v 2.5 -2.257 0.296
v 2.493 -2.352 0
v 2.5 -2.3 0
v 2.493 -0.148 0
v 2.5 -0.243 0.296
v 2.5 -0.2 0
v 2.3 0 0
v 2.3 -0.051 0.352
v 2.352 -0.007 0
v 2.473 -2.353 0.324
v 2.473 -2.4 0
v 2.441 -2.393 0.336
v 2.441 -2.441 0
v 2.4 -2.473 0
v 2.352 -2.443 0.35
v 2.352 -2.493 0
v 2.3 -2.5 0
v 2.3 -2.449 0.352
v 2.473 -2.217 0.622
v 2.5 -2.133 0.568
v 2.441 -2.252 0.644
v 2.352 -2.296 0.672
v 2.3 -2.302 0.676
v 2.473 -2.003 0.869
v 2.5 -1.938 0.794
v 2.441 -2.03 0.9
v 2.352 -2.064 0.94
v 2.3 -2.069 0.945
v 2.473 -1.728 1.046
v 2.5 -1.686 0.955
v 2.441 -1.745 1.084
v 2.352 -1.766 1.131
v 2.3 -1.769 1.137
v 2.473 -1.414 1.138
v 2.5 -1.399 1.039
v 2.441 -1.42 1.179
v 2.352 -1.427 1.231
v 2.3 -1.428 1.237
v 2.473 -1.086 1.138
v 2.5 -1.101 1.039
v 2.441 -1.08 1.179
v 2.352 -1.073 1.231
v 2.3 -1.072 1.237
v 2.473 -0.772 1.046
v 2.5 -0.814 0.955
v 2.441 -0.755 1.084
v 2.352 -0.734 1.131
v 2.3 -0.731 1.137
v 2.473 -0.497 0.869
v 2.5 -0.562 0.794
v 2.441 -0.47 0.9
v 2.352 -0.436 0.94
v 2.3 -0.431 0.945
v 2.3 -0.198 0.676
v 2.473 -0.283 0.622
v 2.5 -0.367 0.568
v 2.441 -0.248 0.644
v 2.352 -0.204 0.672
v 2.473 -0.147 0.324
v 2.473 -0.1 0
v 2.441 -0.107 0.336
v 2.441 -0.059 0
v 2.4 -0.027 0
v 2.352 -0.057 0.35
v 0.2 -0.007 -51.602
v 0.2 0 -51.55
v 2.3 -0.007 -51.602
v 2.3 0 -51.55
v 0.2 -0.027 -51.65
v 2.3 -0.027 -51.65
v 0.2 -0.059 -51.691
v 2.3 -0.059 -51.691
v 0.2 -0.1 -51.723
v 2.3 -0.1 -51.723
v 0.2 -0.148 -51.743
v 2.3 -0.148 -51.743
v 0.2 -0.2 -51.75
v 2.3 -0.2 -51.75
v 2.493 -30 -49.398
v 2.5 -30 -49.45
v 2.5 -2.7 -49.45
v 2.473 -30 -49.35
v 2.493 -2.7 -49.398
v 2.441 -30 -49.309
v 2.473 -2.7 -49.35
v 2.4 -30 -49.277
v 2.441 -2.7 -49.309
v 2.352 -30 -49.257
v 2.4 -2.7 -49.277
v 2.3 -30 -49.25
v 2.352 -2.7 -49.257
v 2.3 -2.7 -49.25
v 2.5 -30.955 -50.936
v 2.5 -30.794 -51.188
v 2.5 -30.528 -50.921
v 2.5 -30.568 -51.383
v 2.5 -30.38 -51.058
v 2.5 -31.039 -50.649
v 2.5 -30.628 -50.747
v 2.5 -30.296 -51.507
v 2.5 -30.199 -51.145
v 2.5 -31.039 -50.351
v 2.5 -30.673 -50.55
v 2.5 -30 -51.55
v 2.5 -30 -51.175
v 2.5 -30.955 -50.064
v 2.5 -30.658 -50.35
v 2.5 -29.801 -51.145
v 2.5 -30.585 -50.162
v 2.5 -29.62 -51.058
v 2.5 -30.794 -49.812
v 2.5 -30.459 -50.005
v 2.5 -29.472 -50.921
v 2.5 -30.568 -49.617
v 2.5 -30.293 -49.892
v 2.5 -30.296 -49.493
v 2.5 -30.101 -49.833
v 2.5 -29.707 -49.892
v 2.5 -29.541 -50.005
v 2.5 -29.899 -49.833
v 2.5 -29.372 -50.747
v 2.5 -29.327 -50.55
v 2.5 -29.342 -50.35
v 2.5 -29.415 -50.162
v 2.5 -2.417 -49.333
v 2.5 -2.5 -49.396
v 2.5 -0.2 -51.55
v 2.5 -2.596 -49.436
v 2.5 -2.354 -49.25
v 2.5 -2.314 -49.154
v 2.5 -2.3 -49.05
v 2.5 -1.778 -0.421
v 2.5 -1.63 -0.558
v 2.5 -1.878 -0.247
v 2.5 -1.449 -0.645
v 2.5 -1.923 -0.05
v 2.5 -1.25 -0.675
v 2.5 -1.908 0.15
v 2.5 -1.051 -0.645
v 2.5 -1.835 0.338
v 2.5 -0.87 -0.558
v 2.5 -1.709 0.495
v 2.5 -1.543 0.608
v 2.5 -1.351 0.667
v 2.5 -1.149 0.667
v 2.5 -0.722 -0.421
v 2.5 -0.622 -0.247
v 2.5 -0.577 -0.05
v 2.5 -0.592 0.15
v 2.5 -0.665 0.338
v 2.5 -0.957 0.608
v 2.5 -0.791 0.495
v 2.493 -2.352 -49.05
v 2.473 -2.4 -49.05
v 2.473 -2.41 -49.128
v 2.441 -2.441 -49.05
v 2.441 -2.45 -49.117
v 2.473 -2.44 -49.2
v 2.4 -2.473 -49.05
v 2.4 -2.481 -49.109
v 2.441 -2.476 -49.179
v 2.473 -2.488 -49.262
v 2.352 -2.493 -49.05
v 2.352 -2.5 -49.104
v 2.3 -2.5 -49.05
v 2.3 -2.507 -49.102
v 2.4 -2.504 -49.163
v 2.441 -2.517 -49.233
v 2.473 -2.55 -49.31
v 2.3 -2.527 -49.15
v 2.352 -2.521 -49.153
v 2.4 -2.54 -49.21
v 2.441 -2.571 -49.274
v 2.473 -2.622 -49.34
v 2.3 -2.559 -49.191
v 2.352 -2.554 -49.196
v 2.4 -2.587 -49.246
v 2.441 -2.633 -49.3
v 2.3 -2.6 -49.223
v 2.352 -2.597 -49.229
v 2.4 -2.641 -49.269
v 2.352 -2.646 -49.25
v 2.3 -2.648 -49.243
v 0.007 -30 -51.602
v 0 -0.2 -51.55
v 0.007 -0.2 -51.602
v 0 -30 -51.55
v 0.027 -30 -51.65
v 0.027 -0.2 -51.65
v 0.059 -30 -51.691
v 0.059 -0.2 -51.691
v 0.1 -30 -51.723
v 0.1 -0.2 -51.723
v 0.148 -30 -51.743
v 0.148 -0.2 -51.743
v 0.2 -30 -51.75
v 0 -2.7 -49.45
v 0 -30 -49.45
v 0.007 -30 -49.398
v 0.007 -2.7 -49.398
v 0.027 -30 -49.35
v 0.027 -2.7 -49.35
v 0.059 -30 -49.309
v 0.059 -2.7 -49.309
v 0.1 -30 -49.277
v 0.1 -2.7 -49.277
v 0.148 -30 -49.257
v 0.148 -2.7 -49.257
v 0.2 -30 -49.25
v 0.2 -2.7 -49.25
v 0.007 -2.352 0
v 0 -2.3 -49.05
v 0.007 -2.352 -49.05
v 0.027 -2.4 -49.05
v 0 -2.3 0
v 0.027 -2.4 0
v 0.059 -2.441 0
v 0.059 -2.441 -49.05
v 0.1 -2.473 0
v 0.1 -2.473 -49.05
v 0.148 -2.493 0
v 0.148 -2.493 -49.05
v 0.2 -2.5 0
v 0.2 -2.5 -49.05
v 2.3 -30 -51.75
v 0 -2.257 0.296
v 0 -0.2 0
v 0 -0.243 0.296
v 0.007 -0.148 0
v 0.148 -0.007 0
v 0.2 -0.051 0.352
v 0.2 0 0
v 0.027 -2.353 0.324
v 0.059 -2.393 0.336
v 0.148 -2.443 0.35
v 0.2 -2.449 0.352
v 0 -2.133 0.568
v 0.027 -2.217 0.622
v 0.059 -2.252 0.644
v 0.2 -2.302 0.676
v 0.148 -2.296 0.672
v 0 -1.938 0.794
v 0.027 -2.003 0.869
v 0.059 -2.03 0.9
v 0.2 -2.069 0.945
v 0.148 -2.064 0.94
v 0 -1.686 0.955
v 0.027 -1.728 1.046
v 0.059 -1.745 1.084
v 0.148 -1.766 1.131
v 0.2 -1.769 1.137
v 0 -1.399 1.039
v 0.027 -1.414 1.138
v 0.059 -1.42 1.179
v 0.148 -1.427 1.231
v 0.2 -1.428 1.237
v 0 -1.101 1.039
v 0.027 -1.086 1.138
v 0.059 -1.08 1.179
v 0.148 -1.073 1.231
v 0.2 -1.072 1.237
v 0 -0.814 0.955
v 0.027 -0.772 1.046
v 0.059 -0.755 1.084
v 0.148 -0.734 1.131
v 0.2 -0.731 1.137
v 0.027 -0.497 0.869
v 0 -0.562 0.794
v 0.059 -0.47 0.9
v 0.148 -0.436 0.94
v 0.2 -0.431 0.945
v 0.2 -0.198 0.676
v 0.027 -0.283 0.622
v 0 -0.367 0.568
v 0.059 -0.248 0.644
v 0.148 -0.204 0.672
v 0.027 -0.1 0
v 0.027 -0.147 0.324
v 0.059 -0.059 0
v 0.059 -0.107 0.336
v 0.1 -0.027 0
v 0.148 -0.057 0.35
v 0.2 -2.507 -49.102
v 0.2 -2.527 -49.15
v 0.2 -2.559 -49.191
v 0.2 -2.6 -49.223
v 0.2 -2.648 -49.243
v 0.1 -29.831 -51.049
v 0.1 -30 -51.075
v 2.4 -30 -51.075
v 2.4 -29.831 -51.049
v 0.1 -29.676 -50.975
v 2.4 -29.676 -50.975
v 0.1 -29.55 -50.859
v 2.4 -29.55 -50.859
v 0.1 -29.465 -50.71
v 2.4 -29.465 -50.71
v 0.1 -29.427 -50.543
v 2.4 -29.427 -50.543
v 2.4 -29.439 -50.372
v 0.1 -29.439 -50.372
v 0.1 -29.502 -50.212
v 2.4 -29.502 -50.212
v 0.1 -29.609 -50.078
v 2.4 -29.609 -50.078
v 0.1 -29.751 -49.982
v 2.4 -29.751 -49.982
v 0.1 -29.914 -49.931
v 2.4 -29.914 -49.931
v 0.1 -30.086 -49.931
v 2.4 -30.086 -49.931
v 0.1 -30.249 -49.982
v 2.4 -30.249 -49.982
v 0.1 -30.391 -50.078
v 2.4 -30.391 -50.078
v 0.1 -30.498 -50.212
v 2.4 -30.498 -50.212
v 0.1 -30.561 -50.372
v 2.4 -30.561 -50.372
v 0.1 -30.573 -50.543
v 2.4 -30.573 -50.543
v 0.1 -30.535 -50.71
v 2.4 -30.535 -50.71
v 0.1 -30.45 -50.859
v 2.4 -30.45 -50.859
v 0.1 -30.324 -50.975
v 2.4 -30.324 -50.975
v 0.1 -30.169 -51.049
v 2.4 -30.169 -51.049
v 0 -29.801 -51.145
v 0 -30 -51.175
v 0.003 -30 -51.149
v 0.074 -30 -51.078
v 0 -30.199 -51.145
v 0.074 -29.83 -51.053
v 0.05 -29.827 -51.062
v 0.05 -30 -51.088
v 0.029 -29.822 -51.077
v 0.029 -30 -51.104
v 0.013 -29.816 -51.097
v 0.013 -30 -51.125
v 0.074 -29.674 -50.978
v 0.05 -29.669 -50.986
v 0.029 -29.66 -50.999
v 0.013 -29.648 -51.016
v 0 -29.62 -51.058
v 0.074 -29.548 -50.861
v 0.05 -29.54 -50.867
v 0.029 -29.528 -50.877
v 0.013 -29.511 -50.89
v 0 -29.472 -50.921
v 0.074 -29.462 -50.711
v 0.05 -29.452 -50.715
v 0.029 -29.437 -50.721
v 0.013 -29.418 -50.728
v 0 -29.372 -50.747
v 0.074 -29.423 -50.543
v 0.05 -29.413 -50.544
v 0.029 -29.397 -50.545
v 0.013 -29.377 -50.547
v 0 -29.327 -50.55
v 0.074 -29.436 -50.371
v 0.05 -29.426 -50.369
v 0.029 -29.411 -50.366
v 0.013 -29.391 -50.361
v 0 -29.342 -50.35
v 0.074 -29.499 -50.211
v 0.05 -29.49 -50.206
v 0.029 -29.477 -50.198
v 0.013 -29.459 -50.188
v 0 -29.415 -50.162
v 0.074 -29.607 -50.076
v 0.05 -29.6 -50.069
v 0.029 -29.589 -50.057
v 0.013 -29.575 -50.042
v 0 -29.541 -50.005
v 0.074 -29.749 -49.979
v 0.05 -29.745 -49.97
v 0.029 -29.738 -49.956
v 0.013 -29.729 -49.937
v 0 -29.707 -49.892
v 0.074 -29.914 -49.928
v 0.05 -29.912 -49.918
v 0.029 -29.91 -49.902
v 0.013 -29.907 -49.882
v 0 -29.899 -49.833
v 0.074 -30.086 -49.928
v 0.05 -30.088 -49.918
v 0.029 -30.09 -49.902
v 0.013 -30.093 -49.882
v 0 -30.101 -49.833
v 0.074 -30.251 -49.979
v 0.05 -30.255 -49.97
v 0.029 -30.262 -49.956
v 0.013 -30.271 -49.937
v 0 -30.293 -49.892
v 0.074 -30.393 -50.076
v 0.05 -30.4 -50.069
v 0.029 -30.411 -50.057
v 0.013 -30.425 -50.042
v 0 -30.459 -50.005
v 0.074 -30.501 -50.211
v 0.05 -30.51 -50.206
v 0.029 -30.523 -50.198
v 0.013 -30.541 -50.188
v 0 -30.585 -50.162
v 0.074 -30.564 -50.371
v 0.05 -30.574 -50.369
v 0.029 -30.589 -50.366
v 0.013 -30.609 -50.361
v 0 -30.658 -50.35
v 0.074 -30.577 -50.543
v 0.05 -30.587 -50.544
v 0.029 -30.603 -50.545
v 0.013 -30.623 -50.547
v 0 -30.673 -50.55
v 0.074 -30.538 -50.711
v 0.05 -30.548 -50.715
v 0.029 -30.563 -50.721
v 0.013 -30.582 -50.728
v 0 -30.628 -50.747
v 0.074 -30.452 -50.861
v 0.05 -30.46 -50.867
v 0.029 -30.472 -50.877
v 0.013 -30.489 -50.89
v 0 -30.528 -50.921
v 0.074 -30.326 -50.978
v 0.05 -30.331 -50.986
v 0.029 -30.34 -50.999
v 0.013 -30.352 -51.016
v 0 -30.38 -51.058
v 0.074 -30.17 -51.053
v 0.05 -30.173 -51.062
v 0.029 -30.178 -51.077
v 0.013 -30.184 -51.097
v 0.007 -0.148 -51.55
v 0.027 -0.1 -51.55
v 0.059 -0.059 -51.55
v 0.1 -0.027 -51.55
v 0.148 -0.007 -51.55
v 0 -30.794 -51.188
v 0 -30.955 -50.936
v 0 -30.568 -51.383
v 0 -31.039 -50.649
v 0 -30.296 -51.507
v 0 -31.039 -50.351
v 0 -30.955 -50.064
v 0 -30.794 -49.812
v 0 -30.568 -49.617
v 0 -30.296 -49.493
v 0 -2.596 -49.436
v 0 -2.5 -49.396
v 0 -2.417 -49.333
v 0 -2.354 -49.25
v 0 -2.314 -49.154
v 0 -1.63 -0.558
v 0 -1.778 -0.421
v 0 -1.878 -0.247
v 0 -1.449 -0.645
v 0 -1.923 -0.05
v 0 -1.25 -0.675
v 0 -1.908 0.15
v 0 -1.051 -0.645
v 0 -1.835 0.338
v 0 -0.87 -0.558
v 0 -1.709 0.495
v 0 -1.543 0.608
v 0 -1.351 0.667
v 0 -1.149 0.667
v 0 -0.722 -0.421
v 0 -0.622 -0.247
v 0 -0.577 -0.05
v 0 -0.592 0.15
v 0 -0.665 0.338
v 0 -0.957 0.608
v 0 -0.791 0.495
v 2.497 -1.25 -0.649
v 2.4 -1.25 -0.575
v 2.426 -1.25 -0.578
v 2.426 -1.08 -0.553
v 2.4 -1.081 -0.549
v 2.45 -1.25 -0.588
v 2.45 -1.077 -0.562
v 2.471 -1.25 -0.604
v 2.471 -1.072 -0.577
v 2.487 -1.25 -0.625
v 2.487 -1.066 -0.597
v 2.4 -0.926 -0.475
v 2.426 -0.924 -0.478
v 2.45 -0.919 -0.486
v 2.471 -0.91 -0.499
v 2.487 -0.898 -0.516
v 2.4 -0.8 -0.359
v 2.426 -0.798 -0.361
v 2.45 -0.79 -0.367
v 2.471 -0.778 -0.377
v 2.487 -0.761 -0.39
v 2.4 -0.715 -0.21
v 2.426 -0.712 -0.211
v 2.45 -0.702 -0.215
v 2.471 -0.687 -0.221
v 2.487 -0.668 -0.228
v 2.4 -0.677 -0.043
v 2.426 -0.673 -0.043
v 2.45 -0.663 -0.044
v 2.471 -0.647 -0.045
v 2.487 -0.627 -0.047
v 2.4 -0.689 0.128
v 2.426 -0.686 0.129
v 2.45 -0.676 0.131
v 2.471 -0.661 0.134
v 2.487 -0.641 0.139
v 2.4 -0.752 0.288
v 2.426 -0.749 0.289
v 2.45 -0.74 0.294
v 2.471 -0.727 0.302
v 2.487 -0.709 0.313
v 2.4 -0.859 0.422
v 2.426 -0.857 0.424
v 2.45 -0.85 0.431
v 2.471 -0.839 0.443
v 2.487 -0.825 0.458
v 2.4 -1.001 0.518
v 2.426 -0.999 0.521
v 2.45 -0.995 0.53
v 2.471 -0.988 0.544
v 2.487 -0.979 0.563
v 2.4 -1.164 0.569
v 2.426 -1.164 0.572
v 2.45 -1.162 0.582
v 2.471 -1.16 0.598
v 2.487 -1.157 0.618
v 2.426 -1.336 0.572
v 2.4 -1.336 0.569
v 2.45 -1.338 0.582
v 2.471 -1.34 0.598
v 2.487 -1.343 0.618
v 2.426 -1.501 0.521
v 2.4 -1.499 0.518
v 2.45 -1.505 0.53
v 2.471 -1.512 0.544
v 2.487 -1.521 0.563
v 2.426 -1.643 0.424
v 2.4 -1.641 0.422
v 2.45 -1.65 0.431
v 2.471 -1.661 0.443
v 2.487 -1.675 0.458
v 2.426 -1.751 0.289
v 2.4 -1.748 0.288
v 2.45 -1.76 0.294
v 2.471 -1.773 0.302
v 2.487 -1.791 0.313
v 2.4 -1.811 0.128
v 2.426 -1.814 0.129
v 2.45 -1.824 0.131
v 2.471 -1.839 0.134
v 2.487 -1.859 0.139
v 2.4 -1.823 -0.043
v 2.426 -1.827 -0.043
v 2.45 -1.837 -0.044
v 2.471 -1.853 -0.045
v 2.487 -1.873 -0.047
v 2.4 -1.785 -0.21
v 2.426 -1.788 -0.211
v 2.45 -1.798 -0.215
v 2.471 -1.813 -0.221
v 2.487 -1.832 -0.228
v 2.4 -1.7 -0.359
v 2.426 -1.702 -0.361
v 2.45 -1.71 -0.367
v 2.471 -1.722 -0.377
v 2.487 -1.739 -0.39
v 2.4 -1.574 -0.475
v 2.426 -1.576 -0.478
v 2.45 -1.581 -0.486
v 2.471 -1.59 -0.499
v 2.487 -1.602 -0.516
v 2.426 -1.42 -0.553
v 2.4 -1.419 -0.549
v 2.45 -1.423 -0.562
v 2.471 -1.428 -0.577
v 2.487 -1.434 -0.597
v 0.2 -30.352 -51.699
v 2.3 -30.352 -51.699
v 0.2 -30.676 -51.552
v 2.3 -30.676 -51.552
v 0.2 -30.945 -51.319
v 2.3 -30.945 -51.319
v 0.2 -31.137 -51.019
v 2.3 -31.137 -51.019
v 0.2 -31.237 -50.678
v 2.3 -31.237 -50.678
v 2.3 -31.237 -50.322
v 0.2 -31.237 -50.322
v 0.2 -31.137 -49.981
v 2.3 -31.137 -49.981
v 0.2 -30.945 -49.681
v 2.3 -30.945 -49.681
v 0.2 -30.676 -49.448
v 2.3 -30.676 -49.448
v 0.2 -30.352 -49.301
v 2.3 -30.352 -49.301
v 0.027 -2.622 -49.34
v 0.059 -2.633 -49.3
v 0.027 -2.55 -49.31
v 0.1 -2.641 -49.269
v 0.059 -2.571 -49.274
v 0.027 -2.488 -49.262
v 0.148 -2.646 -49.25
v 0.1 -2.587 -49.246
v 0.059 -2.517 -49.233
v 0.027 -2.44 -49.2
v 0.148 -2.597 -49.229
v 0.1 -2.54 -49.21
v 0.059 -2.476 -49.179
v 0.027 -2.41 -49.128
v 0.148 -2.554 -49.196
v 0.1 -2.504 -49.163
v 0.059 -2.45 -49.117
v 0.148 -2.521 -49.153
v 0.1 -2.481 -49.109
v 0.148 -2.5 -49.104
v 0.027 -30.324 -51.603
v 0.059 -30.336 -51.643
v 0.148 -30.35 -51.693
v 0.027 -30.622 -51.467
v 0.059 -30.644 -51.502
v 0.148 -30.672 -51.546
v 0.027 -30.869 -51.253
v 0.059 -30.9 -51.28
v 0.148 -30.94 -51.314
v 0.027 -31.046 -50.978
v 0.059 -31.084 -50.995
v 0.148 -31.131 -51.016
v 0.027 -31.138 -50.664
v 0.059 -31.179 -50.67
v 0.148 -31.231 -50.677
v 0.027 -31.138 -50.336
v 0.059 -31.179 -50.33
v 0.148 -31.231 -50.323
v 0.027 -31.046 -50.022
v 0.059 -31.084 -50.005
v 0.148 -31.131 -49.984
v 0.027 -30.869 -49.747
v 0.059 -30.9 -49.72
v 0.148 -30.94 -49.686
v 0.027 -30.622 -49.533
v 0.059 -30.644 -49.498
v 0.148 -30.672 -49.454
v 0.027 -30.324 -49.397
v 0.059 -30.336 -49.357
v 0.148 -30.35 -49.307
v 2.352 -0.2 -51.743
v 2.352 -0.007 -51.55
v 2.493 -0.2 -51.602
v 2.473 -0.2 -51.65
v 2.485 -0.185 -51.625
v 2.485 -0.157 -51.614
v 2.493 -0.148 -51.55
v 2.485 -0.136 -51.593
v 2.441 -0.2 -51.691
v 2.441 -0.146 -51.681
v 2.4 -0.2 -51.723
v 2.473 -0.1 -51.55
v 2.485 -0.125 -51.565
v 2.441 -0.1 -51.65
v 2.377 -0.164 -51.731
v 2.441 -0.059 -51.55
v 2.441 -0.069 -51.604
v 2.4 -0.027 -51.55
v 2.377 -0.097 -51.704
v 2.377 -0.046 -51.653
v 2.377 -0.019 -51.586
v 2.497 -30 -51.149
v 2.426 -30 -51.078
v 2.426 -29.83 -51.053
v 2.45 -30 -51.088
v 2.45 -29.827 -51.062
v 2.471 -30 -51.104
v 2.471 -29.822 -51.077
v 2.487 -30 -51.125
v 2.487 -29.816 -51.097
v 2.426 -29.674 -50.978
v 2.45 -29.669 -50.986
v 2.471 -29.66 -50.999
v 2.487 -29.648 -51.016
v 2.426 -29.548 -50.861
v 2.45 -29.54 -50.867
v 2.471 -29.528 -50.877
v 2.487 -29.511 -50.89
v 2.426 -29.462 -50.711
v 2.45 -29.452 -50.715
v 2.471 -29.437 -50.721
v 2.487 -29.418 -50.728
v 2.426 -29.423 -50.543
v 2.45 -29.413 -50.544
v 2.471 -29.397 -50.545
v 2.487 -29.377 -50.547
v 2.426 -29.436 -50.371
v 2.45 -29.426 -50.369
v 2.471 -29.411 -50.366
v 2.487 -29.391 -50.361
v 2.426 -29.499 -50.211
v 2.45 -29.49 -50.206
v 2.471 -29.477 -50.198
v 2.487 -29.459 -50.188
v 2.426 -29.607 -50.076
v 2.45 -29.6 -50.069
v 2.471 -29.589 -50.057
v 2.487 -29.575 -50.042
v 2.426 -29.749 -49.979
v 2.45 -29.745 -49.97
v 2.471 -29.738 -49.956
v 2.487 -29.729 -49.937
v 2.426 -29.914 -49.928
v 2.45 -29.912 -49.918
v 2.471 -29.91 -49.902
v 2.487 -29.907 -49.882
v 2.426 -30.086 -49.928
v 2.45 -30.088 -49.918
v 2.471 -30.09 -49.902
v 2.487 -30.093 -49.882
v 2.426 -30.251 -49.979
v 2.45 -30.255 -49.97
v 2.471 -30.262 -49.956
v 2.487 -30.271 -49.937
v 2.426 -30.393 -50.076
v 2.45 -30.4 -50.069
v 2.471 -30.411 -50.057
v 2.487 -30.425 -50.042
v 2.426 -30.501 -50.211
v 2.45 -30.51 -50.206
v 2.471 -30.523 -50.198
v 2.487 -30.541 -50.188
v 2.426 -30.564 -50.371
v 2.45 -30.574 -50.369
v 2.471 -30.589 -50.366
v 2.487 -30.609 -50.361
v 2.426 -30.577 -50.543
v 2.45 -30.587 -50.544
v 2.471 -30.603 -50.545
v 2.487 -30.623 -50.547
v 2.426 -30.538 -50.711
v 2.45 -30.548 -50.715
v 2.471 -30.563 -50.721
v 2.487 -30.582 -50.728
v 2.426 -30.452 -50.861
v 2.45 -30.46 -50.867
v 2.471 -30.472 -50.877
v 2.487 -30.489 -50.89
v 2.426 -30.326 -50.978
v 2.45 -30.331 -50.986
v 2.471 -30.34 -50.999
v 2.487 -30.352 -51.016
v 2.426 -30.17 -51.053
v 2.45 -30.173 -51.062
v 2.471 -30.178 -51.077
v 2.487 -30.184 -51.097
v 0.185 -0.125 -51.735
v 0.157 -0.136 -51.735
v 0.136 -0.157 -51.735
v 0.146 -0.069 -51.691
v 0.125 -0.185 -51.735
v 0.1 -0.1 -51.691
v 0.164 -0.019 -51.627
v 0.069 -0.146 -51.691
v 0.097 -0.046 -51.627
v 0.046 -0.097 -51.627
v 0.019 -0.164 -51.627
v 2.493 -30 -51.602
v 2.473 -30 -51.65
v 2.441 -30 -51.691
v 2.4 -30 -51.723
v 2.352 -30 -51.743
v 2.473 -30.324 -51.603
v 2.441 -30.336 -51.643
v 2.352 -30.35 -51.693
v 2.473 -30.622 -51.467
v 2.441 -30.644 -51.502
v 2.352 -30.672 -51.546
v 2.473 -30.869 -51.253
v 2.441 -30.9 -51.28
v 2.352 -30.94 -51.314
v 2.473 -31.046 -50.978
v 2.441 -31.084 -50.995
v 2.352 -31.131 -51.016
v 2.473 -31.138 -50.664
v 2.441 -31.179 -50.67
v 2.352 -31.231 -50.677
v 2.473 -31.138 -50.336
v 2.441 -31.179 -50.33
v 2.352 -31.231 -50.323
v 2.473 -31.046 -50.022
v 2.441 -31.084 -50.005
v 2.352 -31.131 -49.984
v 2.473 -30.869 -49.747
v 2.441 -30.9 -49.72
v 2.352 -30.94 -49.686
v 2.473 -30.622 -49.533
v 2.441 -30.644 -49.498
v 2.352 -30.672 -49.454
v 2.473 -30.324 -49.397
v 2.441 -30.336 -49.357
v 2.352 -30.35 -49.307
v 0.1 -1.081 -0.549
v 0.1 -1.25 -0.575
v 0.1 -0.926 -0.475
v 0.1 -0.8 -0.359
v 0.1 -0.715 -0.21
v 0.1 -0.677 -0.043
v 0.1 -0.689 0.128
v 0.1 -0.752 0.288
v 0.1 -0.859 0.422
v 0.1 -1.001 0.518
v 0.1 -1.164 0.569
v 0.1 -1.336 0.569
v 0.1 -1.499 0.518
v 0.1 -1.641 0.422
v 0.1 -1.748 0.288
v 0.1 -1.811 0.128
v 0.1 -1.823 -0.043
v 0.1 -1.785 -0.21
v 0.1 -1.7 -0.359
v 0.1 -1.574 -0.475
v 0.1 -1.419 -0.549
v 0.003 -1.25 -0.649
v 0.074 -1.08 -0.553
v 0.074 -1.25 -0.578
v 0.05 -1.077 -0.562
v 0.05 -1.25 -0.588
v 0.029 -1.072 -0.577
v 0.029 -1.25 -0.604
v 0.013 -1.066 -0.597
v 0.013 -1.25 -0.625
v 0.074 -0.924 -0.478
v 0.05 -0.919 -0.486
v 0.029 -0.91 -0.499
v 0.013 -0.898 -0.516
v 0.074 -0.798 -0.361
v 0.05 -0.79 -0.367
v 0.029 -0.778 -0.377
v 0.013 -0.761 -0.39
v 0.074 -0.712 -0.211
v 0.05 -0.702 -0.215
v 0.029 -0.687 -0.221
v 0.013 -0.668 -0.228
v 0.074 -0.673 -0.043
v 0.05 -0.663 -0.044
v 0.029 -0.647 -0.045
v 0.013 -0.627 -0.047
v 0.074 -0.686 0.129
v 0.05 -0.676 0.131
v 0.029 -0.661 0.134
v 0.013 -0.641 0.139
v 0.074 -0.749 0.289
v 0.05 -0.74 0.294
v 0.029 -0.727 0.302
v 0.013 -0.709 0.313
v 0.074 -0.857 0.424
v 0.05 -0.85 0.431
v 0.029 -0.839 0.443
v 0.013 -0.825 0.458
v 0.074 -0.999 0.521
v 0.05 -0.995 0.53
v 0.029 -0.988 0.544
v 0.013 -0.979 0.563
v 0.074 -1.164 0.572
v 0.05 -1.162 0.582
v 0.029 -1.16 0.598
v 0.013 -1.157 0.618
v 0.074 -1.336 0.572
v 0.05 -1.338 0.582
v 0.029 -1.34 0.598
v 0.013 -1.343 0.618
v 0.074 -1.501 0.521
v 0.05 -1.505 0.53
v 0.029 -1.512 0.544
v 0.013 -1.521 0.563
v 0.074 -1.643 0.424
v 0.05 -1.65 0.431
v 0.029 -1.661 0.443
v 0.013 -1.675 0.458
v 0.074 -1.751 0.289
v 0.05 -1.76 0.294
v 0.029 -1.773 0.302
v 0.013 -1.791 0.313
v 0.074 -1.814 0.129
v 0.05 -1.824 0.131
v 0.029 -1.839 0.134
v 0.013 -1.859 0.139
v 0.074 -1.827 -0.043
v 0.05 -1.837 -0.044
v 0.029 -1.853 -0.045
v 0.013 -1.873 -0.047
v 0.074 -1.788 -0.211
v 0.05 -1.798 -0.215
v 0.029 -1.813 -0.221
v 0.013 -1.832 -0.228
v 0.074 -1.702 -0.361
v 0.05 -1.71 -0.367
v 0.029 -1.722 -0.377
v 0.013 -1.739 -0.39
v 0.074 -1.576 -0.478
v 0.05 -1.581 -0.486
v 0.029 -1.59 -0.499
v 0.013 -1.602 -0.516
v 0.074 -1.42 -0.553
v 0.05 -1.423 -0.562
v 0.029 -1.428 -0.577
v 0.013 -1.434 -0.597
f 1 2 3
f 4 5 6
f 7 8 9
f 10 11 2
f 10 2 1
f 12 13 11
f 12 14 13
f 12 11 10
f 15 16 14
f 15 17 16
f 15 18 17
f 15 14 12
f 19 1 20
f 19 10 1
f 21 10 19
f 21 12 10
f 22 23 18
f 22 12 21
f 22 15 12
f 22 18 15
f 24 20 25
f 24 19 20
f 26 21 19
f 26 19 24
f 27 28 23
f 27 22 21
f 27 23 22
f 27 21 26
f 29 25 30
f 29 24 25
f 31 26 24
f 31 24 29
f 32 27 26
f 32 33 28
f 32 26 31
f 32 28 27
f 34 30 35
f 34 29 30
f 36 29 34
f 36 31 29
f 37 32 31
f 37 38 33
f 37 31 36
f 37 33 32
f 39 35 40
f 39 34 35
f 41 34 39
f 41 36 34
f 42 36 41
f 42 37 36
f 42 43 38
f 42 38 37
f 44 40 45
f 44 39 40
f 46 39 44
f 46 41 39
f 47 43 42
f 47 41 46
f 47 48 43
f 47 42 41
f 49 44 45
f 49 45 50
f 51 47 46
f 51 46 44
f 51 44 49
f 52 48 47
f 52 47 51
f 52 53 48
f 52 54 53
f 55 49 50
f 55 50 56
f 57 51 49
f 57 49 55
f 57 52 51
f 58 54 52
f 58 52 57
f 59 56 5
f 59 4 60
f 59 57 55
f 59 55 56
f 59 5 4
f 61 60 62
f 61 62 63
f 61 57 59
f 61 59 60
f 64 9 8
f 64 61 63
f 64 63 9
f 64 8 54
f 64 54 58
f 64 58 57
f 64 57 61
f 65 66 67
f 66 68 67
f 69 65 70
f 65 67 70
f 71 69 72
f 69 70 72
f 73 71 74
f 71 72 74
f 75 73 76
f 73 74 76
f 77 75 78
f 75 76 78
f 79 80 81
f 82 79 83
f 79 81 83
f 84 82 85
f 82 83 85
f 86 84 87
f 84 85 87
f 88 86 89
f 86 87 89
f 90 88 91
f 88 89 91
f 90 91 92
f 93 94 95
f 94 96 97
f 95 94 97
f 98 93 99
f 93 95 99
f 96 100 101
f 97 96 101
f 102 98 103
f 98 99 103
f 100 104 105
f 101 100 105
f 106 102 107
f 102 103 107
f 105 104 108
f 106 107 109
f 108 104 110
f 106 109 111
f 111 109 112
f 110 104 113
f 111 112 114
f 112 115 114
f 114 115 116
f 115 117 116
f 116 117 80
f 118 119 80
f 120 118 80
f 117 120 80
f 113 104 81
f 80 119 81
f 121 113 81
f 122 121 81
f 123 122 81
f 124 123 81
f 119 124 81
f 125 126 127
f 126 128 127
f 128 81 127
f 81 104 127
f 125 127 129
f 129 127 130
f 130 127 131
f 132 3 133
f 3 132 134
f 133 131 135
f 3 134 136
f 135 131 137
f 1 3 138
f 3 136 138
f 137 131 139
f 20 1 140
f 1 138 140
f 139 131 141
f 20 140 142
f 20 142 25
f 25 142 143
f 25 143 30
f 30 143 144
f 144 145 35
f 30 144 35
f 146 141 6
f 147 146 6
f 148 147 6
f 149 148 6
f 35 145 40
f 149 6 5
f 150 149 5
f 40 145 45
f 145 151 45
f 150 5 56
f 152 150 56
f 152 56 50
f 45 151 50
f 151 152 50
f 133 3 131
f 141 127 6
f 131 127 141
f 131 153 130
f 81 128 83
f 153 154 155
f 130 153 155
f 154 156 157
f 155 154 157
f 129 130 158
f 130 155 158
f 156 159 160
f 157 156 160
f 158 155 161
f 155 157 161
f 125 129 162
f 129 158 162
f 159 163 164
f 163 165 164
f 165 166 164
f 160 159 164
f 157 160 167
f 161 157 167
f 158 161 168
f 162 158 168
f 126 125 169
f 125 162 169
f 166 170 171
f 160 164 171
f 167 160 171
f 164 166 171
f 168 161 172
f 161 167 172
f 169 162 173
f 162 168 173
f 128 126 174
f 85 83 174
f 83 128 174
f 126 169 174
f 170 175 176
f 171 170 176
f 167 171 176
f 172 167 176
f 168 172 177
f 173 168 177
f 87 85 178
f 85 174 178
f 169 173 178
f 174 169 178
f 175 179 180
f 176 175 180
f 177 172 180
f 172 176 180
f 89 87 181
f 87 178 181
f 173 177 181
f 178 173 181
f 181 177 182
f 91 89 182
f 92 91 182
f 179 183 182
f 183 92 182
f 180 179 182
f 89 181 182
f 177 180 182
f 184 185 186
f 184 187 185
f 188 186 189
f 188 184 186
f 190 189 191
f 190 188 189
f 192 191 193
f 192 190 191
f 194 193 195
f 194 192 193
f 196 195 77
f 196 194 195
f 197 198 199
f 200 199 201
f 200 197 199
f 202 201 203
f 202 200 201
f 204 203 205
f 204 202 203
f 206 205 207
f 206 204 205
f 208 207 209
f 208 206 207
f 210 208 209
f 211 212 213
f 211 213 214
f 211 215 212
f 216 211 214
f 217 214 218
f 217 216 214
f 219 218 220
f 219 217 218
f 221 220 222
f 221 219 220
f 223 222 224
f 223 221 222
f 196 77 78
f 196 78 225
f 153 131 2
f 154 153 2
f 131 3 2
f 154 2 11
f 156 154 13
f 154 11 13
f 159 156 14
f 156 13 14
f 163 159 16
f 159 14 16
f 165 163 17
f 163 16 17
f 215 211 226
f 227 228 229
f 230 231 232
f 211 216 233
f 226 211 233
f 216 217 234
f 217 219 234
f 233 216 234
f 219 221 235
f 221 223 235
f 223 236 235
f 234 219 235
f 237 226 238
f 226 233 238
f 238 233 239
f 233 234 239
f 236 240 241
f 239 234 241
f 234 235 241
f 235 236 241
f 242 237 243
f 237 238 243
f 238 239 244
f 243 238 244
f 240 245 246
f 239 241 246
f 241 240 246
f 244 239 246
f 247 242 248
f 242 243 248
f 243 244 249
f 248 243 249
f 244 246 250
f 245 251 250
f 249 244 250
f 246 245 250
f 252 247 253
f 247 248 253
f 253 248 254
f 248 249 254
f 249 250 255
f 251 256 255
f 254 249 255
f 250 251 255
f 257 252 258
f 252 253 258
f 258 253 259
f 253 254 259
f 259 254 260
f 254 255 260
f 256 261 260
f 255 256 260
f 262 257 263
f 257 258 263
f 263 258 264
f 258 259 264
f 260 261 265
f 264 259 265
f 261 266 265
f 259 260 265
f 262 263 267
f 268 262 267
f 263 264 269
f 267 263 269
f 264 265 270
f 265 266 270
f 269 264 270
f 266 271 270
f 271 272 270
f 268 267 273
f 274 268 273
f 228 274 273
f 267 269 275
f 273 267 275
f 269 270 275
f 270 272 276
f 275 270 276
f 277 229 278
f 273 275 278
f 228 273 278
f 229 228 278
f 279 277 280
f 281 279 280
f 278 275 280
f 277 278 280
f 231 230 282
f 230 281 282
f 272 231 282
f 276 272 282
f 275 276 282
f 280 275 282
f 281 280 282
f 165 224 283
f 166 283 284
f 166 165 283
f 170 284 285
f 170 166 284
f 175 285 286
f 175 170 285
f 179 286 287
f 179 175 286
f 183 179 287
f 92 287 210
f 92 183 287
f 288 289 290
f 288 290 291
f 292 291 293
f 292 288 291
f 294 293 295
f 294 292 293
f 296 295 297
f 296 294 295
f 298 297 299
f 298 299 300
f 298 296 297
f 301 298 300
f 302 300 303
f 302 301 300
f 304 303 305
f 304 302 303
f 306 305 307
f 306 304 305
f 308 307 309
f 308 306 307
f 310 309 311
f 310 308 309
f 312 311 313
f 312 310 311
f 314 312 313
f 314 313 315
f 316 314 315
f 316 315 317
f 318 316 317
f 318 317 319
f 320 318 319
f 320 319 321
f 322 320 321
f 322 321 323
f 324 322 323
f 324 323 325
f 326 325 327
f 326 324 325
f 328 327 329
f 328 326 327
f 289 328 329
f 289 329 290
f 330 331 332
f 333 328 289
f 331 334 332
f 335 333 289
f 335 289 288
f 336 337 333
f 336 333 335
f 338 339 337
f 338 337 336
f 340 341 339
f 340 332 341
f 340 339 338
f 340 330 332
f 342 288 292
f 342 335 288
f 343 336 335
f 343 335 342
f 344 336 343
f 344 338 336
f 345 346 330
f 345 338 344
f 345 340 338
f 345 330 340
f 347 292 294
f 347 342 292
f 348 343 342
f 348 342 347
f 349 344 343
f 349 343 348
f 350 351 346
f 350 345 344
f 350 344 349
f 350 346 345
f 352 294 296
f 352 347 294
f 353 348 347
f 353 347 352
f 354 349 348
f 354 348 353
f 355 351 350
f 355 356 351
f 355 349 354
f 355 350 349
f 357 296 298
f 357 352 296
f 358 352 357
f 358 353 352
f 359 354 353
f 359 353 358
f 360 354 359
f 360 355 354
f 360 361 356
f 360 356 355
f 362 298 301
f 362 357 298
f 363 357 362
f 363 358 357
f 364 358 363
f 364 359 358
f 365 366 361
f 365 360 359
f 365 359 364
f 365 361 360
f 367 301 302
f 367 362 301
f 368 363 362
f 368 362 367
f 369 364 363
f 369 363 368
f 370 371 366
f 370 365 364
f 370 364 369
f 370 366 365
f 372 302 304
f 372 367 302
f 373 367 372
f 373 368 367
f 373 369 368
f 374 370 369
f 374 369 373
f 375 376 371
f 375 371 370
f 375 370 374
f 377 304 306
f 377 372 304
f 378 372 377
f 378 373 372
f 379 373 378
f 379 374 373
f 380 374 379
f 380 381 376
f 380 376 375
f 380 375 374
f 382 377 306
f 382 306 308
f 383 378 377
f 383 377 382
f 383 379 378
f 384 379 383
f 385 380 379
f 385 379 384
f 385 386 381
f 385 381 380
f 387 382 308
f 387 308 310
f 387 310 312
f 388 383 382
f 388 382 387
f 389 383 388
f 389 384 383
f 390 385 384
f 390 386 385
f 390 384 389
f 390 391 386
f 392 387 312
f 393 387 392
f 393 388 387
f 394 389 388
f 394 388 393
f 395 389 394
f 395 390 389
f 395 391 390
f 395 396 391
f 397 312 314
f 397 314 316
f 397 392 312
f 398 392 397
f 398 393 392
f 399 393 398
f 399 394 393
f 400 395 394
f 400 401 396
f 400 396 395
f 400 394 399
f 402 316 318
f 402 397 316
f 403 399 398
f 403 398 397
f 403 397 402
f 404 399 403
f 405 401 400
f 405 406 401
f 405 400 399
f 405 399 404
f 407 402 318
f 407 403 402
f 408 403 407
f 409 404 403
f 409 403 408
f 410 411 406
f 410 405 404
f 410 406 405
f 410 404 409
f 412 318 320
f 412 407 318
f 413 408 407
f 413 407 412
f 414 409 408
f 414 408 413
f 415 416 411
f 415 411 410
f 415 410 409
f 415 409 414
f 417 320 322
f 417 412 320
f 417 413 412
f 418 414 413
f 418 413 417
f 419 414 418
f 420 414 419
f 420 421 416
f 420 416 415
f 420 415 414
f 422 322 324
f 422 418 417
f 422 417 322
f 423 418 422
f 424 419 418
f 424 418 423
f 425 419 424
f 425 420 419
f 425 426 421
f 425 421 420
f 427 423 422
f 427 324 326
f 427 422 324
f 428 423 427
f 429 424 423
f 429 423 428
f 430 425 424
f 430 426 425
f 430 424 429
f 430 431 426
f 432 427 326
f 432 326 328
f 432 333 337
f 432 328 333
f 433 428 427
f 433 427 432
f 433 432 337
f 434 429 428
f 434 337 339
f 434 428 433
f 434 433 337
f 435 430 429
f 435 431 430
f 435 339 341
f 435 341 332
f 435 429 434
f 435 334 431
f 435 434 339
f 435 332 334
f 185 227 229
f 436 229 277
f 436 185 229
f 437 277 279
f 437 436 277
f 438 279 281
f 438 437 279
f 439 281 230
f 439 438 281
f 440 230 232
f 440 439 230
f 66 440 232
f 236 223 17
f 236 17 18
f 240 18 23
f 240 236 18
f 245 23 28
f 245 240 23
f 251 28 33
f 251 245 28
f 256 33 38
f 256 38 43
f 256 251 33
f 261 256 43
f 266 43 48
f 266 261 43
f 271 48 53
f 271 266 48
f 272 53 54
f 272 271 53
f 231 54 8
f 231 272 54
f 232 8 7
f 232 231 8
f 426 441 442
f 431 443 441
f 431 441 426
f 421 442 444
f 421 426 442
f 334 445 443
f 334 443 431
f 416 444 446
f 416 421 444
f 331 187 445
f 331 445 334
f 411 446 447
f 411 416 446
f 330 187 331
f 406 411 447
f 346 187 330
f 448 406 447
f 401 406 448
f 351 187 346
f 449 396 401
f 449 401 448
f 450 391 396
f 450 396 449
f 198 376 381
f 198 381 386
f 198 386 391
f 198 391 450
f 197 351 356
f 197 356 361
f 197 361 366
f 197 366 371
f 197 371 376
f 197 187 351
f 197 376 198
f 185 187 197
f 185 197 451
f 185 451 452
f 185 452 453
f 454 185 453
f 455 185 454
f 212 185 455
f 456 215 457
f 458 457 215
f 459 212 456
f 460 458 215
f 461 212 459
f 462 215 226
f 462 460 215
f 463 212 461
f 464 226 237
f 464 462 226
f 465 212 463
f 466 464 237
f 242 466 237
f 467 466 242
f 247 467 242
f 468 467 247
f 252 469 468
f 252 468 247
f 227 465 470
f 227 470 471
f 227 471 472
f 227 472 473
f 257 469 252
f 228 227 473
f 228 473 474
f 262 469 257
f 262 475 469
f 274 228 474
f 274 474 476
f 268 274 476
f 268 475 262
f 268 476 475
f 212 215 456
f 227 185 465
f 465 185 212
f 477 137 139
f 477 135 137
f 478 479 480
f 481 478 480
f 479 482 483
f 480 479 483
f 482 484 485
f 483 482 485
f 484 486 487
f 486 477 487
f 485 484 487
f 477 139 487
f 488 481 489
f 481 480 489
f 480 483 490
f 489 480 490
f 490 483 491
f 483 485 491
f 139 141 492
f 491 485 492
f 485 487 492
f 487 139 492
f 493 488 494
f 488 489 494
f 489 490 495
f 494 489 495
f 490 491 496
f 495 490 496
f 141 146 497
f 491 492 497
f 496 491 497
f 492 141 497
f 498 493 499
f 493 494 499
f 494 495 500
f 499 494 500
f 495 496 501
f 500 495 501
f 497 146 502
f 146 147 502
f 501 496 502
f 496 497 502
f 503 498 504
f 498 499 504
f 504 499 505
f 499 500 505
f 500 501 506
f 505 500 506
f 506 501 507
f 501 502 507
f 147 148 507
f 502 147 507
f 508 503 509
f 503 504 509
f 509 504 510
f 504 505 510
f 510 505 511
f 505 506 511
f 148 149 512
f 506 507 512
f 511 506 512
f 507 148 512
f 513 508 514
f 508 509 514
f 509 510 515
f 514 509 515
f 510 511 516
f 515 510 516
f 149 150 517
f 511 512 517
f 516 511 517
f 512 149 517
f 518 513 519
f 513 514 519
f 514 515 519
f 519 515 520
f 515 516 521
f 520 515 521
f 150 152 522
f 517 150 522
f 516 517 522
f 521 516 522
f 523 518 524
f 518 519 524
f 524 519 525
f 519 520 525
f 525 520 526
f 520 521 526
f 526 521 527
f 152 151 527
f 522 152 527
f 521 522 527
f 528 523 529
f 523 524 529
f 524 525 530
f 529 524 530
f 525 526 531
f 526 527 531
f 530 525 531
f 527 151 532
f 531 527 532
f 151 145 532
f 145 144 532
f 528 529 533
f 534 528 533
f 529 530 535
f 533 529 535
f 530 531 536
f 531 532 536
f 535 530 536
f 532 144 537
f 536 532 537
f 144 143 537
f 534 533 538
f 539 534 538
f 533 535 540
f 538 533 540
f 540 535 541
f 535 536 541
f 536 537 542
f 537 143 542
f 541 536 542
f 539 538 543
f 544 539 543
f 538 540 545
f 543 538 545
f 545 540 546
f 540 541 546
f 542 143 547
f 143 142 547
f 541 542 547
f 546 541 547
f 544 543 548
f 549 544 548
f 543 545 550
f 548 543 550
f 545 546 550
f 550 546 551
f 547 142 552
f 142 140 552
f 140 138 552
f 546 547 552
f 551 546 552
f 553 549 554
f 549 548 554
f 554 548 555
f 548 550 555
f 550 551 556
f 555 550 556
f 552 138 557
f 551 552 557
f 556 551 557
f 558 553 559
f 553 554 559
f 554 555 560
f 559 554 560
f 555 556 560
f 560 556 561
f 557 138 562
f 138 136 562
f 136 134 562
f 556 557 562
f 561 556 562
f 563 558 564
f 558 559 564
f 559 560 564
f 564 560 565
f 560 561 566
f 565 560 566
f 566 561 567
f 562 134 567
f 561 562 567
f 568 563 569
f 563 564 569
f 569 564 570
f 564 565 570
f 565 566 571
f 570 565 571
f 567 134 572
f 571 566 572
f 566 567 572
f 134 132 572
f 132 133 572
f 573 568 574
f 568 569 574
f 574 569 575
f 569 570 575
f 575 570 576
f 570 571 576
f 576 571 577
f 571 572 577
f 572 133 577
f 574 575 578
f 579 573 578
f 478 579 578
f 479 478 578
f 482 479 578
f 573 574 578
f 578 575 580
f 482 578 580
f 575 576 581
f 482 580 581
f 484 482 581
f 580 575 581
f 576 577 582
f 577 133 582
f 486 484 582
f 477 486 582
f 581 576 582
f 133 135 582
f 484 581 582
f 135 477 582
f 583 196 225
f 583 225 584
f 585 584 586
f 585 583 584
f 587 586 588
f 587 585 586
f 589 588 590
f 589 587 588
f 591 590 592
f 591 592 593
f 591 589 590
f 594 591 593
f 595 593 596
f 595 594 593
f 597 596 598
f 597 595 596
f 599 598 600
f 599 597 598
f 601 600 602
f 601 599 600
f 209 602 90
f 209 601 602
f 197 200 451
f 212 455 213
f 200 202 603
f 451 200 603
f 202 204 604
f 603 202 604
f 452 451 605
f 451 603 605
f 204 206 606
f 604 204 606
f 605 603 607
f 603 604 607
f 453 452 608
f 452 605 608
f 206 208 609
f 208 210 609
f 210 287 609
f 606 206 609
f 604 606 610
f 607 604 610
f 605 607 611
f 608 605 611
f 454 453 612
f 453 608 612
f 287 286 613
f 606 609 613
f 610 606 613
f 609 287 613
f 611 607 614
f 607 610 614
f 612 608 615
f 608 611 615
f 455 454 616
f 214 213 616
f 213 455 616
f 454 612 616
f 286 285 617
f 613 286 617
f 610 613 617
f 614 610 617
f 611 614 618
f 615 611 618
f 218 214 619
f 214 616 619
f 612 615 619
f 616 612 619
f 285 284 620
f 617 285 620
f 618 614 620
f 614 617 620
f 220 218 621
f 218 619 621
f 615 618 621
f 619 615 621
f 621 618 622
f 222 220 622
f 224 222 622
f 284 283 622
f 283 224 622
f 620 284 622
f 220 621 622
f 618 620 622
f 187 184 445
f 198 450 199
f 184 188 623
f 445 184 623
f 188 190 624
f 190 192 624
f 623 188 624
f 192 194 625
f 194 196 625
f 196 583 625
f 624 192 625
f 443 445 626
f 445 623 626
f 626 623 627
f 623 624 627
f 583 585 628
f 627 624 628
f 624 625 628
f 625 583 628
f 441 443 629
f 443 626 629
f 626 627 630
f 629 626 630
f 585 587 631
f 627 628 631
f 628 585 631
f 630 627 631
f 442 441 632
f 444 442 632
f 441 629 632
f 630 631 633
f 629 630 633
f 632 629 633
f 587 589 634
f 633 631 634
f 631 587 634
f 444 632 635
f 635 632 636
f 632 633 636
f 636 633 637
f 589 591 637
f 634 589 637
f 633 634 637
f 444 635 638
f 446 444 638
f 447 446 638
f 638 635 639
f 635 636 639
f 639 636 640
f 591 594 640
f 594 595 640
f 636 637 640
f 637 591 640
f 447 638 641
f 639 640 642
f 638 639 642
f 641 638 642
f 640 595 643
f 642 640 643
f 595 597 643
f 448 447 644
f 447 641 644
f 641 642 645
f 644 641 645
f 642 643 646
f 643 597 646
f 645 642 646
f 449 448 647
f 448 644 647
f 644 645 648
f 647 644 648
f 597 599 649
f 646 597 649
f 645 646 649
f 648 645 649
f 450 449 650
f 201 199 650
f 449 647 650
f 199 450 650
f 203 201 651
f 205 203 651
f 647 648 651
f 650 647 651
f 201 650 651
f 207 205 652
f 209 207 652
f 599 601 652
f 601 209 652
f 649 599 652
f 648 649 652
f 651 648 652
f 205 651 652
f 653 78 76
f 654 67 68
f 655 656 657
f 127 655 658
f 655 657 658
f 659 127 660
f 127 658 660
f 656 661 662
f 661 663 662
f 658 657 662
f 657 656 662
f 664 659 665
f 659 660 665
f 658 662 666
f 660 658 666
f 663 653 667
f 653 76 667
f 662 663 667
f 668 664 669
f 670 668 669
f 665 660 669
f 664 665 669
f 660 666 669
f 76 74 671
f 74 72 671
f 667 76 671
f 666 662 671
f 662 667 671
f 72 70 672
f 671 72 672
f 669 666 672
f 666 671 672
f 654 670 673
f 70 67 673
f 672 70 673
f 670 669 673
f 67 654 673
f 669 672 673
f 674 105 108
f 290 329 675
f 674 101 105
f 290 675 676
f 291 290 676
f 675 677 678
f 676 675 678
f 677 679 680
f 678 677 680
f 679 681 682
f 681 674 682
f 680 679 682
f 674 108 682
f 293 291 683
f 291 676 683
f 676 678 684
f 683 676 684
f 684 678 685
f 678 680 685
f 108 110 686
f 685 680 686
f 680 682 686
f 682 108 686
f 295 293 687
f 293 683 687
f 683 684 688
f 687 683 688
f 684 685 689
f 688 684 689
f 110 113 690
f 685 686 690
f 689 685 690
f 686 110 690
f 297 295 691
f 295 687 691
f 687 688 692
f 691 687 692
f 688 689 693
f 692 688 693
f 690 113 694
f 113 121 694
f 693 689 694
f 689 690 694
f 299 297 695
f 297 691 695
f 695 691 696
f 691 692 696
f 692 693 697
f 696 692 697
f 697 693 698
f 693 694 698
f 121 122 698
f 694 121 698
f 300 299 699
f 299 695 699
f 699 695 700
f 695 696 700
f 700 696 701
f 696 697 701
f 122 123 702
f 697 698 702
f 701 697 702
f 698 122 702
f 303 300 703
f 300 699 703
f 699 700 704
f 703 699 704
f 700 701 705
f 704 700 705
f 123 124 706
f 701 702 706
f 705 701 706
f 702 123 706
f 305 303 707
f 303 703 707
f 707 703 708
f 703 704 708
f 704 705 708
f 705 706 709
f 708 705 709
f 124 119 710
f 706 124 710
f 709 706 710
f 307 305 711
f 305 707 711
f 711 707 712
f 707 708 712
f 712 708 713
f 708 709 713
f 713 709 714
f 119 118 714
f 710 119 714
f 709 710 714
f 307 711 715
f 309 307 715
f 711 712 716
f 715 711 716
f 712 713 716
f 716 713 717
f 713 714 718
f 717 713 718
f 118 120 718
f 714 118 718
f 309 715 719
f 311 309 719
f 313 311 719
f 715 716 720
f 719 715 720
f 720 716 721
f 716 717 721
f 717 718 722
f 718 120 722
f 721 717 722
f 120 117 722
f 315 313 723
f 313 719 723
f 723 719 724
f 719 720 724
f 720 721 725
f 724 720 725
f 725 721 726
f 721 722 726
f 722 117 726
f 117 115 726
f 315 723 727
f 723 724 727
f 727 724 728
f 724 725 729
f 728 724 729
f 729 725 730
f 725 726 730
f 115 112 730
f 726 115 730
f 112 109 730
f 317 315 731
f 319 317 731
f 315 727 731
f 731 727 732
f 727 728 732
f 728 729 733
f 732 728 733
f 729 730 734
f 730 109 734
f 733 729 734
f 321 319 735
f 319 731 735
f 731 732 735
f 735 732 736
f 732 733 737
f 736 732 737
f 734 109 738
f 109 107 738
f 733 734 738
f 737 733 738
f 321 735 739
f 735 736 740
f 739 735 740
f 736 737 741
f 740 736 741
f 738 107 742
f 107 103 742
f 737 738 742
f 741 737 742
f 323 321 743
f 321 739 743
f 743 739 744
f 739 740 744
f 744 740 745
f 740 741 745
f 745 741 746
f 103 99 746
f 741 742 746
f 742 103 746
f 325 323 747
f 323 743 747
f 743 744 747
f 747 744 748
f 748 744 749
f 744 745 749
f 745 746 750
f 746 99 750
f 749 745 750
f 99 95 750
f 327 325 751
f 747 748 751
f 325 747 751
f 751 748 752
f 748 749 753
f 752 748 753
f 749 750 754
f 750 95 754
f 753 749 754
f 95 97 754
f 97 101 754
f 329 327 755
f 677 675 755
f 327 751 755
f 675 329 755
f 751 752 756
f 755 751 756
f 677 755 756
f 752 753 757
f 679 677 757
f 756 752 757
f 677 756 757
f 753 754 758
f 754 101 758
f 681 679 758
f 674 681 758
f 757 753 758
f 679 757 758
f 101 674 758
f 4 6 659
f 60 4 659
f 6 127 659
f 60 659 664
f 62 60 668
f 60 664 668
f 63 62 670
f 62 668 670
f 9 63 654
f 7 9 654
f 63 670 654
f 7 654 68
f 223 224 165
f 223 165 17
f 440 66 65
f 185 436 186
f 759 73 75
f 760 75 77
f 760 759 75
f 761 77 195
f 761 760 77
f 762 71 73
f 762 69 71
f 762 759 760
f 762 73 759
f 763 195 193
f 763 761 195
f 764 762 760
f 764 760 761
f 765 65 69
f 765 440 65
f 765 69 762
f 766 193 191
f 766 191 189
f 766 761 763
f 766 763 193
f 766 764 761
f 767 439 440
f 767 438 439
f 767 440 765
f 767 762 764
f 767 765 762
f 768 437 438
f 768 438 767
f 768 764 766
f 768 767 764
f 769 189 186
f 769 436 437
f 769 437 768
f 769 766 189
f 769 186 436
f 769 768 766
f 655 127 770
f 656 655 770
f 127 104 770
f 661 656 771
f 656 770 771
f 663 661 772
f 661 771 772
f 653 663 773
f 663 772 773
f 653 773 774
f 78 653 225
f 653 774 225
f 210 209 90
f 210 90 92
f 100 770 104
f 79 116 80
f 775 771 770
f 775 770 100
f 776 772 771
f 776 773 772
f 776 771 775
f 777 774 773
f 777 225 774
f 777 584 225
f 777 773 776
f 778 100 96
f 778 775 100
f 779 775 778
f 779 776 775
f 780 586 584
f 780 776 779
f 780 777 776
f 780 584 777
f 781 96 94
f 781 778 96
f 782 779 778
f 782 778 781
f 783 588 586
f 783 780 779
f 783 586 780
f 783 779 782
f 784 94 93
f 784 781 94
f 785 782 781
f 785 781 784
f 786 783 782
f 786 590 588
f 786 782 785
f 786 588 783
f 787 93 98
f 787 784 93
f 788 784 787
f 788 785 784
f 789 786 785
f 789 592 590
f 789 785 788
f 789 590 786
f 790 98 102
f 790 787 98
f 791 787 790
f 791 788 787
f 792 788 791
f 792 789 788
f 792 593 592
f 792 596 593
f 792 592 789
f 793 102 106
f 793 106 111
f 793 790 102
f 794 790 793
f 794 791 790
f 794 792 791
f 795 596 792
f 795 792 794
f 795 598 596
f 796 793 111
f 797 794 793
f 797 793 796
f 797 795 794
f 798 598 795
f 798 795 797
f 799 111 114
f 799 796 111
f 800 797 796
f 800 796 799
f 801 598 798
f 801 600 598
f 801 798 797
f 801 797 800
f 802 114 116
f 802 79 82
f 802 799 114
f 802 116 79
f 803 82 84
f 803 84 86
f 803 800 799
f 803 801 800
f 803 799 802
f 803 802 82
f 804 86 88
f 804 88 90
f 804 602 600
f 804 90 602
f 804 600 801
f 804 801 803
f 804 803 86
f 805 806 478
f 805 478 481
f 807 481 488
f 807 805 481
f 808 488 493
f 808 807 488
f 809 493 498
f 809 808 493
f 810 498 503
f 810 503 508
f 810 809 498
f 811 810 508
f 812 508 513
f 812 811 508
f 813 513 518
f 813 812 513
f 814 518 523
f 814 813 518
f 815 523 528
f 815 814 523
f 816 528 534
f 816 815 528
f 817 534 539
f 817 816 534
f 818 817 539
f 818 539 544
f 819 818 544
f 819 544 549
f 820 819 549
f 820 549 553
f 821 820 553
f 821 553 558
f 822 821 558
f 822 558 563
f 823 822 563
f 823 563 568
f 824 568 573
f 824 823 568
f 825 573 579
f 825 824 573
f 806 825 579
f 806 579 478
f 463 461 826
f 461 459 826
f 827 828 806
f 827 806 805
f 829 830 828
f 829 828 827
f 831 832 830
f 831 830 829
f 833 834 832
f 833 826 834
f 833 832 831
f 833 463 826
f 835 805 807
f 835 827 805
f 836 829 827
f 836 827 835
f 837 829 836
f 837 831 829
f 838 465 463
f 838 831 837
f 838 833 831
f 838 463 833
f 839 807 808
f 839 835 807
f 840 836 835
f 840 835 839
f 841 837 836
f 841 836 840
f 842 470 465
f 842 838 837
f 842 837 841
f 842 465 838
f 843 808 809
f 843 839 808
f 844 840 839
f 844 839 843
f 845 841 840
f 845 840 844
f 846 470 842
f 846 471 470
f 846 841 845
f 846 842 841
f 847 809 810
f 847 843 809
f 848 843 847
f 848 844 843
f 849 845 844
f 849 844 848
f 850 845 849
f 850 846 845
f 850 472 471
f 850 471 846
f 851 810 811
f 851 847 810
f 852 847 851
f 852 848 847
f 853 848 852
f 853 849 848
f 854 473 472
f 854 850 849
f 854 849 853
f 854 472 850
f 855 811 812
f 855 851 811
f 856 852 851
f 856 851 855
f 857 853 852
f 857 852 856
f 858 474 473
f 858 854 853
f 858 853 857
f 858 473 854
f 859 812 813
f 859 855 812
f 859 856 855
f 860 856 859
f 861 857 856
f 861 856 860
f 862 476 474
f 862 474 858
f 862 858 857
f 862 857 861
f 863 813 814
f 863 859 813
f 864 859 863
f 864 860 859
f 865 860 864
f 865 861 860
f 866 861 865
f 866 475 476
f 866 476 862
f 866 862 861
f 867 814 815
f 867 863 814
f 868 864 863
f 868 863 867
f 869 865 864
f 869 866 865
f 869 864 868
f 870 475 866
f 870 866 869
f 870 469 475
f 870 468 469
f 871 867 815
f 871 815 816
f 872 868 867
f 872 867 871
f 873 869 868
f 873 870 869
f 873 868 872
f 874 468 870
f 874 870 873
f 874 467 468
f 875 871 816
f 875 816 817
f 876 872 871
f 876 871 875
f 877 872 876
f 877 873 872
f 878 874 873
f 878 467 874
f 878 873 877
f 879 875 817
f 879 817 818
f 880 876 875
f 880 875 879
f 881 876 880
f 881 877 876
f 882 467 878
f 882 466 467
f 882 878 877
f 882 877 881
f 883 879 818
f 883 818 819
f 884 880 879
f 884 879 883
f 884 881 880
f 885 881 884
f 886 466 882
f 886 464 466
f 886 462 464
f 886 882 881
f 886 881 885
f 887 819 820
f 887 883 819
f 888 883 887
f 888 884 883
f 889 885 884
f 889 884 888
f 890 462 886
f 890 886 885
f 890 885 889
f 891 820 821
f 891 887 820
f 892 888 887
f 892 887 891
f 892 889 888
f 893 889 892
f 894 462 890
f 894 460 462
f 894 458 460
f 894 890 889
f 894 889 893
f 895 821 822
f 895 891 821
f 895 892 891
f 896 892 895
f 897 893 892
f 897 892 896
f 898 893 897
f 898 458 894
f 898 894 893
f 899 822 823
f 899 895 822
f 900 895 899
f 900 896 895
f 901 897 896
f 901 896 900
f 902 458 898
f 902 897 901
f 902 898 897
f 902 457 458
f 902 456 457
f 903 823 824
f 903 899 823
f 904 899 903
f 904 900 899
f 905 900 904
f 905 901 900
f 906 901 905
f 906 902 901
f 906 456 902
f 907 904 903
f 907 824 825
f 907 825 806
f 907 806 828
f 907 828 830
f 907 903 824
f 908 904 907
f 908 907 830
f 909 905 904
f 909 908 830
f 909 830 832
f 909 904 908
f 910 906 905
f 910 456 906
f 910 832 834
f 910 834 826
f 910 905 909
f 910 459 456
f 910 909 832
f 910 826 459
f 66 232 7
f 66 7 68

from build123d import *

# Parameters (mm, degrees)
SKETCH1_R           = 0.575
BOSS_EXTRUDE1_DEPTH = 2.5
FILLET2_R           = 0.1
FILLET3_R           = 0.2


with BuildPart() as part:
    # Sketch1 → Boss-Extrude1 (new body)
    with BuildSketch(Plane(origin=(0, 0, 0), x_dir=(0, 0, -1), z_dir=(1, 0, 0))):
        with BuildLine():
            Line((0, 0), (50.5, 0))
            Line((50.5, 0), (51.75, 0))
            Line((51.75, 0), (51.75, -30))
            ThreePointArc((51.75, -30), (50.5, -31.25), (49.25, -30))
            Line((49.25, -30), (49.25, -2.5))
            Line((49.25, -2.5), (0, -2.5))
            ThreePointArc((0, -2.5), (-1.25, -1.25), (0, 0))
        make_face()
        with Locations((0, -1.25)):
            Circle(SKETCH1_R, mode=Mode.SUBTRACT)
        with Locations((50.5, -30)):
            Circle(SKETCH1_R, mode=Mode.SUBTRACT)
    extrude(amount=BOSS_EXTRUDE1_DEPTH)

    # Fillet2
    fillet2_edges = [part.edges().sort_by_distance(p)[0] for p in [
        (0, -1.25, 0.575),
        (2.5, -1.25, 0.575),
        (0, -30, -49.925),
        (2.5, -30, -49.925),
    ]]
    fillet(fillet2_edges, radius=FILLET2_R)

    # Fillet3
    fillet3_edges = [part.edges().sort_by_distance(p)[0] for p in [
        (0, -1.25, 1.25),
        (1.25, 0, -51.75),
        (2.5, -16.25, -49.25),
        (1.25, -2.5, -49.25),
        (2.5, -31.25, -50.5),
        (2.5, -15, -51.75),
        (2.5, 0, -25.875),
        (2.5, -1.25, 1.25),
        (0, 0, -25.875),
        (0, -15, -51.75),
        (0, -31.25, -50.5),
        (2.5, -2.5, -24.625),
        (0, -16.25, -49.25),
        (0, -2.5, -24.625),
    ]]
    fillet(fillet3_edges, radius=FILLET3_R)


solid = part.part
